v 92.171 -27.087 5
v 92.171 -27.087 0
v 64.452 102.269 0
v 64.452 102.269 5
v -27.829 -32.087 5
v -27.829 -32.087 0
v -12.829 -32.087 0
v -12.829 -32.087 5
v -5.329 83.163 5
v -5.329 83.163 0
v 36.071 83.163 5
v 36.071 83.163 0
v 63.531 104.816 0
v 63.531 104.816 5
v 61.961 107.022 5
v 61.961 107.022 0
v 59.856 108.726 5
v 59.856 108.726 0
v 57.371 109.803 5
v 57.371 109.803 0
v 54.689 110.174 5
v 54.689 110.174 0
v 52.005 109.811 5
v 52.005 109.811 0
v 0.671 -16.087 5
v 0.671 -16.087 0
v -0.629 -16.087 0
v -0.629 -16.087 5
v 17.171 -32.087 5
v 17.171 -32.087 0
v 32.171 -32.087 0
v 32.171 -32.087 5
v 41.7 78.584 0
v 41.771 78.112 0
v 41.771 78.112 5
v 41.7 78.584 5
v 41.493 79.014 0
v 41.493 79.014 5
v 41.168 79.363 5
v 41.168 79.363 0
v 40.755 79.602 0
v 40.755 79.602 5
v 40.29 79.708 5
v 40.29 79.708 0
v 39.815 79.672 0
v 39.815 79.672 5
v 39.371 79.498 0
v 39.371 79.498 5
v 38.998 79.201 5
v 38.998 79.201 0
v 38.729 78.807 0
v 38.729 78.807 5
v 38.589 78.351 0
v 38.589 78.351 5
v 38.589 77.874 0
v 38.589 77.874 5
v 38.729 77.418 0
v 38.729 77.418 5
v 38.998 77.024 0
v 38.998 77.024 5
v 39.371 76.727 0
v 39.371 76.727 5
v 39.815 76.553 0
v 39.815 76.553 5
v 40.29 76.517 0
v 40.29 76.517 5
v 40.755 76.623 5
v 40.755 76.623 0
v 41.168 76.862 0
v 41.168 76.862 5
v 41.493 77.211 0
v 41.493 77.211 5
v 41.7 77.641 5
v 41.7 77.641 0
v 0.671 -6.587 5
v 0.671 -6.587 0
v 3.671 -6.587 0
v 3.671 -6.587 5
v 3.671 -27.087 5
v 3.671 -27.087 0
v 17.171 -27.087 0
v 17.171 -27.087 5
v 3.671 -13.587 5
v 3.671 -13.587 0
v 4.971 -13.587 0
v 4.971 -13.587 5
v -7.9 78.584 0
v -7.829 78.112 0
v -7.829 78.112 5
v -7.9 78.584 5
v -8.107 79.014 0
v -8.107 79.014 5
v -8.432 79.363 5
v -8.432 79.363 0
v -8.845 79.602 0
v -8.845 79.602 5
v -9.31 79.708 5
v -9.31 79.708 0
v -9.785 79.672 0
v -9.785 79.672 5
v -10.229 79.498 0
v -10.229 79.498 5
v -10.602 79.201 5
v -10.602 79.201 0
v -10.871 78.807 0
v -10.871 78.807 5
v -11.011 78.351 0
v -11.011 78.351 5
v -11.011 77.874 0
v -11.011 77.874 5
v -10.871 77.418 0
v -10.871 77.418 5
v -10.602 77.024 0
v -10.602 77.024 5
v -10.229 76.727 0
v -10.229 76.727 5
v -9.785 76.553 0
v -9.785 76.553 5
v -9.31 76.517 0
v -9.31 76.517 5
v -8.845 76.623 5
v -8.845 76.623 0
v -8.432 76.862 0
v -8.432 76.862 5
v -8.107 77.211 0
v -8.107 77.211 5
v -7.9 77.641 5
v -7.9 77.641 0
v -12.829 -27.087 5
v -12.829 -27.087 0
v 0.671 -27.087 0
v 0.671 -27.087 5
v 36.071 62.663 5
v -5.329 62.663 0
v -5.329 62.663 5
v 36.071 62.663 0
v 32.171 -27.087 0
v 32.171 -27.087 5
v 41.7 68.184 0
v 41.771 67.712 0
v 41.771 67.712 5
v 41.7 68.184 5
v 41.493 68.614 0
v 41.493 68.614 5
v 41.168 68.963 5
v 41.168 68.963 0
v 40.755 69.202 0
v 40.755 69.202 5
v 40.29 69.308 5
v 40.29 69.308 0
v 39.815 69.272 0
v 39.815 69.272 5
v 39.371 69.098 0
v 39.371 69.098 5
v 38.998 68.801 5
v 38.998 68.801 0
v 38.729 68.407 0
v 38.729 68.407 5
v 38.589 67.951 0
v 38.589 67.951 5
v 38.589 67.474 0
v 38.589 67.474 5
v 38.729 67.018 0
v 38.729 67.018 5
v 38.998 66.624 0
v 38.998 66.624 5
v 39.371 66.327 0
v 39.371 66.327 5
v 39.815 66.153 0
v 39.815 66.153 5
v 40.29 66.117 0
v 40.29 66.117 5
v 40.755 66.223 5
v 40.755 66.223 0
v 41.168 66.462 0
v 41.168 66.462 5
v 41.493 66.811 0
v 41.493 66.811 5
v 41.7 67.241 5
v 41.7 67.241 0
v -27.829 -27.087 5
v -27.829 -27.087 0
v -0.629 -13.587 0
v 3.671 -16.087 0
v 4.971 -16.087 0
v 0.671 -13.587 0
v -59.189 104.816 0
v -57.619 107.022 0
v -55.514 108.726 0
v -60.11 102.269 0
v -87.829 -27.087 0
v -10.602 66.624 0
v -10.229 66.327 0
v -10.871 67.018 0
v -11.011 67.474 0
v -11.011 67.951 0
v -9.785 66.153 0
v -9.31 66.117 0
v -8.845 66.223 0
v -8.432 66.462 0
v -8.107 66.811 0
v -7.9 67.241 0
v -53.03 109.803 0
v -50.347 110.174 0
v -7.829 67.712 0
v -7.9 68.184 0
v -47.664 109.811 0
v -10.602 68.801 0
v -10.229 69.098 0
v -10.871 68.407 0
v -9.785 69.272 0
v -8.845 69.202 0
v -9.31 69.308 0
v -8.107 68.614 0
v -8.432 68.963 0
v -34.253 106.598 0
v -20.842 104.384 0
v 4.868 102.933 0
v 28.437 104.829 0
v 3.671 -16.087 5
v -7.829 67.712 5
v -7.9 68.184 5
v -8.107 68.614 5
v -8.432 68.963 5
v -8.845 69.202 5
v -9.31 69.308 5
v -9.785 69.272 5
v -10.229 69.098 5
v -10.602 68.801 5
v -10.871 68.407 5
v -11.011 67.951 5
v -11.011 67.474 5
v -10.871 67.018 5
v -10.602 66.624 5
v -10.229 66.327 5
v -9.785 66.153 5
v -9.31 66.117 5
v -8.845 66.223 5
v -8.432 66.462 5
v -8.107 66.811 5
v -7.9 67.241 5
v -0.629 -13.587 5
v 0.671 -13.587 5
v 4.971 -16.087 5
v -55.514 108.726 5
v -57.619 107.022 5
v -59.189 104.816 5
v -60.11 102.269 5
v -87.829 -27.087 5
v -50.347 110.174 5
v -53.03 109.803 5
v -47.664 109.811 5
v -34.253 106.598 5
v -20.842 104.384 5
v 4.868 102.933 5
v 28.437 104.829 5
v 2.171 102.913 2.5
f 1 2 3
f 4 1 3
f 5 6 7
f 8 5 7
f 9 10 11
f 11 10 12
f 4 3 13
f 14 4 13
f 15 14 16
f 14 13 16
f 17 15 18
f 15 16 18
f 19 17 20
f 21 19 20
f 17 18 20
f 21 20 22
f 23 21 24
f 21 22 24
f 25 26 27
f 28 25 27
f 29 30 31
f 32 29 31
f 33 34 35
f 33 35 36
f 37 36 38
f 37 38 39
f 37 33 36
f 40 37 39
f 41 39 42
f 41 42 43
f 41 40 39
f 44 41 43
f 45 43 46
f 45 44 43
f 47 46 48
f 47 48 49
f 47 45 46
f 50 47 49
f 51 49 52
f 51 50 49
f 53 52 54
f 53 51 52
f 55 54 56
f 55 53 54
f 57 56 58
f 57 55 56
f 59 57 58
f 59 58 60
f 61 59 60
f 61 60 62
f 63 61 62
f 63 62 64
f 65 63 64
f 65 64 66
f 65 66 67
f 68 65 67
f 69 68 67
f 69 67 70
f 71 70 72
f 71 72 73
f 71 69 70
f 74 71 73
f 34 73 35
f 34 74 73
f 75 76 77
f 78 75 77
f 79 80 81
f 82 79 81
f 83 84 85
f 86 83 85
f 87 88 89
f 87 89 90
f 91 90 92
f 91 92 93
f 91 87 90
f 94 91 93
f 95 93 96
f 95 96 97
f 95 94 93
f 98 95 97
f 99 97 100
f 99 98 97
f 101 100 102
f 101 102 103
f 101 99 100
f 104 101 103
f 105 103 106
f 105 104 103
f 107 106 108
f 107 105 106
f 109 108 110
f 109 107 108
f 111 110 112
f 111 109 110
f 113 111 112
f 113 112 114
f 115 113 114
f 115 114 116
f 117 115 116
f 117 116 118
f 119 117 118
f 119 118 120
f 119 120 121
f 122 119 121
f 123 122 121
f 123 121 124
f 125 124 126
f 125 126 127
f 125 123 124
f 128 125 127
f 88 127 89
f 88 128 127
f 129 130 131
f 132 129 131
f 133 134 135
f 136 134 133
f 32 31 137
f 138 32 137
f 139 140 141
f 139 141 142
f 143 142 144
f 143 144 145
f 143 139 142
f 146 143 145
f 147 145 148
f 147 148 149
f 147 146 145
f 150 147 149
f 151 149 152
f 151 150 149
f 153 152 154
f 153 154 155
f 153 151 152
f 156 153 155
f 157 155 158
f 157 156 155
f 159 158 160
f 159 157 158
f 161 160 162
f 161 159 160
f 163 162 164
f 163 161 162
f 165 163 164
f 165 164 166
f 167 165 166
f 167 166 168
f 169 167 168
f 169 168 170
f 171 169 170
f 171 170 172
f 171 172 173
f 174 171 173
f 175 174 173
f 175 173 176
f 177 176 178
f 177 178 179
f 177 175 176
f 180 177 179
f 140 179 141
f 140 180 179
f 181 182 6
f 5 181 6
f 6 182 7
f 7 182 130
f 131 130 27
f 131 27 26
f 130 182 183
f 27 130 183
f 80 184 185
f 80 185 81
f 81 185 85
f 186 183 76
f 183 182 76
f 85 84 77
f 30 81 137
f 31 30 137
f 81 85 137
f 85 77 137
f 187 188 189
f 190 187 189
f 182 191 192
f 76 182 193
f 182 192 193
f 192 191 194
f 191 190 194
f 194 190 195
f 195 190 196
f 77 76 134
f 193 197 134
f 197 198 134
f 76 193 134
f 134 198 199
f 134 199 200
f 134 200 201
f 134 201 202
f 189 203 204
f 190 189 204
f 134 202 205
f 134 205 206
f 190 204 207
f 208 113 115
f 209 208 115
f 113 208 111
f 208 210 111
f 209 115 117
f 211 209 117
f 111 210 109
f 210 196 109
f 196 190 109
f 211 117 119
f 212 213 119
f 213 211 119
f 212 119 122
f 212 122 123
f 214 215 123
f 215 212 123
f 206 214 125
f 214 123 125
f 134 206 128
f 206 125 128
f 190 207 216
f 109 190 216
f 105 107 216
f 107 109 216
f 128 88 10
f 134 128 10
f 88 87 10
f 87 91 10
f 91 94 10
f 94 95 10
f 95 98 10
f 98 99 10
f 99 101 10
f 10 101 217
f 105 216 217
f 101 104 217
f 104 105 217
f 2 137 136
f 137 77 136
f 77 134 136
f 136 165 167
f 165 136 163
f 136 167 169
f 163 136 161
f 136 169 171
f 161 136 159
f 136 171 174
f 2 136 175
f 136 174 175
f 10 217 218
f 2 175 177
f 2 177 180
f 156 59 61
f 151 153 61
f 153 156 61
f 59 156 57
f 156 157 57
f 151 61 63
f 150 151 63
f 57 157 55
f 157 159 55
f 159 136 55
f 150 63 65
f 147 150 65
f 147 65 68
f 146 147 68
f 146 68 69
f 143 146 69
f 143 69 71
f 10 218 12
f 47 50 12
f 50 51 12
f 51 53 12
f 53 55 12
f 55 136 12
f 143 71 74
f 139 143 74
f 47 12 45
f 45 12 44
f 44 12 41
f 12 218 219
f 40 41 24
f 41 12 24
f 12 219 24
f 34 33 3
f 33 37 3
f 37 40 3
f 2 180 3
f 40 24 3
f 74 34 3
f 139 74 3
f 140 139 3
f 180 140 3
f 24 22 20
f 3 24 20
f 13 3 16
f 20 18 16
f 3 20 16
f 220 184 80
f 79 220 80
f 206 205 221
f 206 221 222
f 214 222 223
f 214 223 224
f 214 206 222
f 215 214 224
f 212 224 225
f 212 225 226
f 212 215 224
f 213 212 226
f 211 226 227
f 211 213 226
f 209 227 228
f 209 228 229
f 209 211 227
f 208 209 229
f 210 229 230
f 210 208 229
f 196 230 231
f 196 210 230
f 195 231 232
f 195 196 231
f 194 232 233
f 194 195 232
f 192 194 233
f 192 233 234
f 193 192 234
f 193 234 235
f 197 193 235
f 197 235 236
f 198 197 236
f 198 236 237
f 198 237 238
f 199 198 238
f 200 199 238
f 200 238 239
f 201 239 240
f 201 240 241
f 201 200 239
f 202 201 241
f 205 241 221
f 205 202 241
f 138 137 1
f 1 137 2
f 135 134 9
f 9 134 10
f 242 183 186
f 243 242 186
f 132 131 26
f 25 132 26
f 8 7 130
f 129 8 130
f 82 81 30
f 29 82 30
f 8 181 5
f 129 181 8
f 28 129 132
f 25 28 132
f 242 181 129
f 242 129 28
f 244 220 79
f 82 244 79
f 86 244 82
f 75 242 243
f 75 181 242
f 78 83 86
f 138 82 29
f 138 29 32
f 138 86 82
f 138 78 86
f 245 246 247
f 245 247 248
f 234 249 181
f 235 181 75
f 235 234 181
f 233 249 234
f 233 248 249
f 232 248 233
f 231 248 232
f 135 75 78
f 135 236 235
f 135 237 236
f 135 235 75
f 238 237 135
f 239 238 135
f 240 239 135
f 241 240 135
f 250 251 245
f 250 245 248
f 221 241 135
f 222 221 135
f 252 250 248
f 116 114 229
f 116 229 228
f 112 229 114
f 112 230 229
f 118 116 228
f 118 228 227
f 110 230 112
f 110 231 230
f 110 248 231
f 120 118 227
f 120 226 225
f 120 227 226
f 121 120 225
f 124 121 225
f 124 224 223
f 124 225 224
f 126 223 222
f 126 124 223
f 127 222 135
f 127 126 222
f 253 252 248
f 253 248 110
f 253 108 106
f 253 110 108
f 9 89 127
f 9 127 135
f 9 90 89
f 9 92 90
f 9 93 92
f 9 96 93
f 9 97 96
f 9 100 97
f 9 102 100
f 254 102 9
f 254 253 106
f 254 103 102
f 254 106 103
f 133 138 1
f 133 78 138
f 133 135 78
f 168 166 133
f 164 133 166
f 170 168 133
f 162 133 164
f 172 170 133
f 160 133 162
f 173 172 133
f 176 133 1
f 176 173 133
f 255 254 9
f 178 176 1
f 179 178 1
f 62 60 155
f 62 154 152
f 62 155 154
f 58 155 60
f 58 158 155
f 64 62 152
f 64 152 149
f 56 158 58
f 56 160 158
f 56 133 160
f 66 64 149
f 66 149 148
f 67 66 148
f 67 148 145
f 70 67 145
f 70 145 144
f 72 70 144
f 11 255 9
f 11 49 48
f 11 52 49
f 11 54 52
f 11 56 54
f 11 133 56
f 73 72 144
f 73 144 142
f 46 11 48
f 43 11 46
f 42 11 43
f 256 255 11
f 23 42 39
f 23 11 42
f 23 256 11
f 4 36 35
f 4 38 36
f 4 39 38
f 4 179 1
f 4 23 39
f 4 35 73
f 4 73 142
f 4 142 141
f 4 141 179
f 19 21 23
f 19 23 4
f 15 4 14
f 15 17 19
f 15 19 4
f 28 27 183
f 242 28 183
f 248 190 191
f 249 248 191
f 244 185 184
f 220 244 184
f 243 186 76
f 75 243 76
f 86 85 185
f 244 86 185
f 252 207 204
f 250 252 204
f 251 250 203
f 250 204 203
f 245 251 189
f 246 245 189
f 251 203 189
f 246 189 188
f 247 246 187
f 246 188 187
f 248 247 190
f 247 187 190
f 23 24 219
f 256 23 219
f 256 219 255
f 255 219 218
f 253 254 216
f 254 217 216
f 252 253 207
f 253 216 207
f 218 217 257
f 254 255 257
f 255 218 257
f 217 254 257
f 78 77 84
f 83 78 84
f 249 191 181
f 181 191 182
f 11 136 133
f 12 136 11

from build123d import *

# Parameters (mm, degrees)
SKETCH1_R           = 1.6
SKETCH1_W           = 41.4
SKETCH1_H           = 20.5
BOSS_EXTRUDE1_DEPTH = 5


with BuildPart() as part:
    # Sketch1 → Boss-Extrude1 (new body)
    with BuildSketch(Plane.XY):
        with BuildLine():
            Line((-27.829133209, -27.087428792), (-27.829133209, -32.087428792))
            Line((-27.829133209, -32.087428792), (-12.829133209, -32.087428792))
            Line((-12.829133209, -32.087428792), (-12.829133209, -27.087428792))
            Line((-12.829133209, -27.087428792), (0.670866791, -27.087428792))
            Line((0.670866791, -27.087428792), (0.670866791, -16.087428792))
            Line((0.670866791, -16.087428792), (-0.629133209, -16.087428792))
            Line((-0.629133209, -16.087428792), (-0.629133209, -13.587428792))
            Line((-0.629133209, -13.587428792), (0.670866791, -13.587428792))
            Line((0.670866791, -13.587428792), (0.670866791, -6.587428792))
            Line((0.670866791, -6.587428792), (3.670866791, -6.587428792))
            Line((3.670866791, -6.587428792), (3.670866791, -13.587428792))
            Line((3.670866791, -13.587428792), (4.970866791, -13.587428792))
            Line((4.970866791, -13.587428792), (4.970866791, -16.087428792))
            Line((4.970866791, -16.087428792), (3.670866791, -16.087428792))
            Line((3.670866791, -16.087428792), (3.670866791, -27.087428792))
            Line((3.670866791, -27.087428792), (17.170866791, -27.087428792))
            Line((17.170866791, -27.087428792), (17.170866791, -32.087428792))
            Line((17.170866791, -32.087428792), (32.170866791, -32.087428792))
            Line((32.170866791, -32.087428792), (32.170866791, -27.087428792))
            Line((32.170866791, -27.087428792), (92.170866791, -27.087428792))
            Line((92.170866791, -27.087428792), (64.451640551, 102.268960326))
            ThreePointArc((64.451640551, 102.268960326), (59.856128602, 108.725953776), (52.005403293, 109.81112962))
            add(Edge.make_bspline(
                [(52.005403293, 109.81112962), (35.393891125, 105.212090679), (2.170866791, 100.613051738), (-31.052157544, 105.212090679), (-47.663669711, 109.81112962)],
                knots=[0.084712196, 0.084712196, 0.084712196, 0.084712196, 0.5, 0.915287804, 0.915287804, 0.915287804, 0.915287804], degree=3))
            ThreePointArc((-47.663669711, 109.81112962), (-55.51439502, 108.725953776), (-60.10990697, 102.268960326))
            Line((-60.10990697, 102.268960326), (-87.829133209, -27.087428792))
            Line((-87.829133209, -27.087428792), (-27.829133209, -27.087428792))
        make_face()
        with Locations((-9.429133209, 78.112442288)):
            Circle(SKETCH1_R, mode=Mode.SUBTRACT)
        with Locations((-9.429133209, 67.712442288)):
            Circle(SKETCH1_R, mode=Mode.SUBTRACT)
        with Locations((40.170866791, 67.712442288)):
            Circle(SKETCH1_R, mode=Mode.SUBTRACT)
        with Locations((40.170866791, 78.112442288)):
            Circle(SKETCH1_R, mode=Mode.SUBTRACT)
        with Locations((15.370866791, 72.912571208)):
            Rectangle(SKETCH1_W, SKETCH1_H, mode=Mode.SUBTRACT)
    extrude(amount=BOSS_EXTRUDE1_DEPTH)


solid = part.part
